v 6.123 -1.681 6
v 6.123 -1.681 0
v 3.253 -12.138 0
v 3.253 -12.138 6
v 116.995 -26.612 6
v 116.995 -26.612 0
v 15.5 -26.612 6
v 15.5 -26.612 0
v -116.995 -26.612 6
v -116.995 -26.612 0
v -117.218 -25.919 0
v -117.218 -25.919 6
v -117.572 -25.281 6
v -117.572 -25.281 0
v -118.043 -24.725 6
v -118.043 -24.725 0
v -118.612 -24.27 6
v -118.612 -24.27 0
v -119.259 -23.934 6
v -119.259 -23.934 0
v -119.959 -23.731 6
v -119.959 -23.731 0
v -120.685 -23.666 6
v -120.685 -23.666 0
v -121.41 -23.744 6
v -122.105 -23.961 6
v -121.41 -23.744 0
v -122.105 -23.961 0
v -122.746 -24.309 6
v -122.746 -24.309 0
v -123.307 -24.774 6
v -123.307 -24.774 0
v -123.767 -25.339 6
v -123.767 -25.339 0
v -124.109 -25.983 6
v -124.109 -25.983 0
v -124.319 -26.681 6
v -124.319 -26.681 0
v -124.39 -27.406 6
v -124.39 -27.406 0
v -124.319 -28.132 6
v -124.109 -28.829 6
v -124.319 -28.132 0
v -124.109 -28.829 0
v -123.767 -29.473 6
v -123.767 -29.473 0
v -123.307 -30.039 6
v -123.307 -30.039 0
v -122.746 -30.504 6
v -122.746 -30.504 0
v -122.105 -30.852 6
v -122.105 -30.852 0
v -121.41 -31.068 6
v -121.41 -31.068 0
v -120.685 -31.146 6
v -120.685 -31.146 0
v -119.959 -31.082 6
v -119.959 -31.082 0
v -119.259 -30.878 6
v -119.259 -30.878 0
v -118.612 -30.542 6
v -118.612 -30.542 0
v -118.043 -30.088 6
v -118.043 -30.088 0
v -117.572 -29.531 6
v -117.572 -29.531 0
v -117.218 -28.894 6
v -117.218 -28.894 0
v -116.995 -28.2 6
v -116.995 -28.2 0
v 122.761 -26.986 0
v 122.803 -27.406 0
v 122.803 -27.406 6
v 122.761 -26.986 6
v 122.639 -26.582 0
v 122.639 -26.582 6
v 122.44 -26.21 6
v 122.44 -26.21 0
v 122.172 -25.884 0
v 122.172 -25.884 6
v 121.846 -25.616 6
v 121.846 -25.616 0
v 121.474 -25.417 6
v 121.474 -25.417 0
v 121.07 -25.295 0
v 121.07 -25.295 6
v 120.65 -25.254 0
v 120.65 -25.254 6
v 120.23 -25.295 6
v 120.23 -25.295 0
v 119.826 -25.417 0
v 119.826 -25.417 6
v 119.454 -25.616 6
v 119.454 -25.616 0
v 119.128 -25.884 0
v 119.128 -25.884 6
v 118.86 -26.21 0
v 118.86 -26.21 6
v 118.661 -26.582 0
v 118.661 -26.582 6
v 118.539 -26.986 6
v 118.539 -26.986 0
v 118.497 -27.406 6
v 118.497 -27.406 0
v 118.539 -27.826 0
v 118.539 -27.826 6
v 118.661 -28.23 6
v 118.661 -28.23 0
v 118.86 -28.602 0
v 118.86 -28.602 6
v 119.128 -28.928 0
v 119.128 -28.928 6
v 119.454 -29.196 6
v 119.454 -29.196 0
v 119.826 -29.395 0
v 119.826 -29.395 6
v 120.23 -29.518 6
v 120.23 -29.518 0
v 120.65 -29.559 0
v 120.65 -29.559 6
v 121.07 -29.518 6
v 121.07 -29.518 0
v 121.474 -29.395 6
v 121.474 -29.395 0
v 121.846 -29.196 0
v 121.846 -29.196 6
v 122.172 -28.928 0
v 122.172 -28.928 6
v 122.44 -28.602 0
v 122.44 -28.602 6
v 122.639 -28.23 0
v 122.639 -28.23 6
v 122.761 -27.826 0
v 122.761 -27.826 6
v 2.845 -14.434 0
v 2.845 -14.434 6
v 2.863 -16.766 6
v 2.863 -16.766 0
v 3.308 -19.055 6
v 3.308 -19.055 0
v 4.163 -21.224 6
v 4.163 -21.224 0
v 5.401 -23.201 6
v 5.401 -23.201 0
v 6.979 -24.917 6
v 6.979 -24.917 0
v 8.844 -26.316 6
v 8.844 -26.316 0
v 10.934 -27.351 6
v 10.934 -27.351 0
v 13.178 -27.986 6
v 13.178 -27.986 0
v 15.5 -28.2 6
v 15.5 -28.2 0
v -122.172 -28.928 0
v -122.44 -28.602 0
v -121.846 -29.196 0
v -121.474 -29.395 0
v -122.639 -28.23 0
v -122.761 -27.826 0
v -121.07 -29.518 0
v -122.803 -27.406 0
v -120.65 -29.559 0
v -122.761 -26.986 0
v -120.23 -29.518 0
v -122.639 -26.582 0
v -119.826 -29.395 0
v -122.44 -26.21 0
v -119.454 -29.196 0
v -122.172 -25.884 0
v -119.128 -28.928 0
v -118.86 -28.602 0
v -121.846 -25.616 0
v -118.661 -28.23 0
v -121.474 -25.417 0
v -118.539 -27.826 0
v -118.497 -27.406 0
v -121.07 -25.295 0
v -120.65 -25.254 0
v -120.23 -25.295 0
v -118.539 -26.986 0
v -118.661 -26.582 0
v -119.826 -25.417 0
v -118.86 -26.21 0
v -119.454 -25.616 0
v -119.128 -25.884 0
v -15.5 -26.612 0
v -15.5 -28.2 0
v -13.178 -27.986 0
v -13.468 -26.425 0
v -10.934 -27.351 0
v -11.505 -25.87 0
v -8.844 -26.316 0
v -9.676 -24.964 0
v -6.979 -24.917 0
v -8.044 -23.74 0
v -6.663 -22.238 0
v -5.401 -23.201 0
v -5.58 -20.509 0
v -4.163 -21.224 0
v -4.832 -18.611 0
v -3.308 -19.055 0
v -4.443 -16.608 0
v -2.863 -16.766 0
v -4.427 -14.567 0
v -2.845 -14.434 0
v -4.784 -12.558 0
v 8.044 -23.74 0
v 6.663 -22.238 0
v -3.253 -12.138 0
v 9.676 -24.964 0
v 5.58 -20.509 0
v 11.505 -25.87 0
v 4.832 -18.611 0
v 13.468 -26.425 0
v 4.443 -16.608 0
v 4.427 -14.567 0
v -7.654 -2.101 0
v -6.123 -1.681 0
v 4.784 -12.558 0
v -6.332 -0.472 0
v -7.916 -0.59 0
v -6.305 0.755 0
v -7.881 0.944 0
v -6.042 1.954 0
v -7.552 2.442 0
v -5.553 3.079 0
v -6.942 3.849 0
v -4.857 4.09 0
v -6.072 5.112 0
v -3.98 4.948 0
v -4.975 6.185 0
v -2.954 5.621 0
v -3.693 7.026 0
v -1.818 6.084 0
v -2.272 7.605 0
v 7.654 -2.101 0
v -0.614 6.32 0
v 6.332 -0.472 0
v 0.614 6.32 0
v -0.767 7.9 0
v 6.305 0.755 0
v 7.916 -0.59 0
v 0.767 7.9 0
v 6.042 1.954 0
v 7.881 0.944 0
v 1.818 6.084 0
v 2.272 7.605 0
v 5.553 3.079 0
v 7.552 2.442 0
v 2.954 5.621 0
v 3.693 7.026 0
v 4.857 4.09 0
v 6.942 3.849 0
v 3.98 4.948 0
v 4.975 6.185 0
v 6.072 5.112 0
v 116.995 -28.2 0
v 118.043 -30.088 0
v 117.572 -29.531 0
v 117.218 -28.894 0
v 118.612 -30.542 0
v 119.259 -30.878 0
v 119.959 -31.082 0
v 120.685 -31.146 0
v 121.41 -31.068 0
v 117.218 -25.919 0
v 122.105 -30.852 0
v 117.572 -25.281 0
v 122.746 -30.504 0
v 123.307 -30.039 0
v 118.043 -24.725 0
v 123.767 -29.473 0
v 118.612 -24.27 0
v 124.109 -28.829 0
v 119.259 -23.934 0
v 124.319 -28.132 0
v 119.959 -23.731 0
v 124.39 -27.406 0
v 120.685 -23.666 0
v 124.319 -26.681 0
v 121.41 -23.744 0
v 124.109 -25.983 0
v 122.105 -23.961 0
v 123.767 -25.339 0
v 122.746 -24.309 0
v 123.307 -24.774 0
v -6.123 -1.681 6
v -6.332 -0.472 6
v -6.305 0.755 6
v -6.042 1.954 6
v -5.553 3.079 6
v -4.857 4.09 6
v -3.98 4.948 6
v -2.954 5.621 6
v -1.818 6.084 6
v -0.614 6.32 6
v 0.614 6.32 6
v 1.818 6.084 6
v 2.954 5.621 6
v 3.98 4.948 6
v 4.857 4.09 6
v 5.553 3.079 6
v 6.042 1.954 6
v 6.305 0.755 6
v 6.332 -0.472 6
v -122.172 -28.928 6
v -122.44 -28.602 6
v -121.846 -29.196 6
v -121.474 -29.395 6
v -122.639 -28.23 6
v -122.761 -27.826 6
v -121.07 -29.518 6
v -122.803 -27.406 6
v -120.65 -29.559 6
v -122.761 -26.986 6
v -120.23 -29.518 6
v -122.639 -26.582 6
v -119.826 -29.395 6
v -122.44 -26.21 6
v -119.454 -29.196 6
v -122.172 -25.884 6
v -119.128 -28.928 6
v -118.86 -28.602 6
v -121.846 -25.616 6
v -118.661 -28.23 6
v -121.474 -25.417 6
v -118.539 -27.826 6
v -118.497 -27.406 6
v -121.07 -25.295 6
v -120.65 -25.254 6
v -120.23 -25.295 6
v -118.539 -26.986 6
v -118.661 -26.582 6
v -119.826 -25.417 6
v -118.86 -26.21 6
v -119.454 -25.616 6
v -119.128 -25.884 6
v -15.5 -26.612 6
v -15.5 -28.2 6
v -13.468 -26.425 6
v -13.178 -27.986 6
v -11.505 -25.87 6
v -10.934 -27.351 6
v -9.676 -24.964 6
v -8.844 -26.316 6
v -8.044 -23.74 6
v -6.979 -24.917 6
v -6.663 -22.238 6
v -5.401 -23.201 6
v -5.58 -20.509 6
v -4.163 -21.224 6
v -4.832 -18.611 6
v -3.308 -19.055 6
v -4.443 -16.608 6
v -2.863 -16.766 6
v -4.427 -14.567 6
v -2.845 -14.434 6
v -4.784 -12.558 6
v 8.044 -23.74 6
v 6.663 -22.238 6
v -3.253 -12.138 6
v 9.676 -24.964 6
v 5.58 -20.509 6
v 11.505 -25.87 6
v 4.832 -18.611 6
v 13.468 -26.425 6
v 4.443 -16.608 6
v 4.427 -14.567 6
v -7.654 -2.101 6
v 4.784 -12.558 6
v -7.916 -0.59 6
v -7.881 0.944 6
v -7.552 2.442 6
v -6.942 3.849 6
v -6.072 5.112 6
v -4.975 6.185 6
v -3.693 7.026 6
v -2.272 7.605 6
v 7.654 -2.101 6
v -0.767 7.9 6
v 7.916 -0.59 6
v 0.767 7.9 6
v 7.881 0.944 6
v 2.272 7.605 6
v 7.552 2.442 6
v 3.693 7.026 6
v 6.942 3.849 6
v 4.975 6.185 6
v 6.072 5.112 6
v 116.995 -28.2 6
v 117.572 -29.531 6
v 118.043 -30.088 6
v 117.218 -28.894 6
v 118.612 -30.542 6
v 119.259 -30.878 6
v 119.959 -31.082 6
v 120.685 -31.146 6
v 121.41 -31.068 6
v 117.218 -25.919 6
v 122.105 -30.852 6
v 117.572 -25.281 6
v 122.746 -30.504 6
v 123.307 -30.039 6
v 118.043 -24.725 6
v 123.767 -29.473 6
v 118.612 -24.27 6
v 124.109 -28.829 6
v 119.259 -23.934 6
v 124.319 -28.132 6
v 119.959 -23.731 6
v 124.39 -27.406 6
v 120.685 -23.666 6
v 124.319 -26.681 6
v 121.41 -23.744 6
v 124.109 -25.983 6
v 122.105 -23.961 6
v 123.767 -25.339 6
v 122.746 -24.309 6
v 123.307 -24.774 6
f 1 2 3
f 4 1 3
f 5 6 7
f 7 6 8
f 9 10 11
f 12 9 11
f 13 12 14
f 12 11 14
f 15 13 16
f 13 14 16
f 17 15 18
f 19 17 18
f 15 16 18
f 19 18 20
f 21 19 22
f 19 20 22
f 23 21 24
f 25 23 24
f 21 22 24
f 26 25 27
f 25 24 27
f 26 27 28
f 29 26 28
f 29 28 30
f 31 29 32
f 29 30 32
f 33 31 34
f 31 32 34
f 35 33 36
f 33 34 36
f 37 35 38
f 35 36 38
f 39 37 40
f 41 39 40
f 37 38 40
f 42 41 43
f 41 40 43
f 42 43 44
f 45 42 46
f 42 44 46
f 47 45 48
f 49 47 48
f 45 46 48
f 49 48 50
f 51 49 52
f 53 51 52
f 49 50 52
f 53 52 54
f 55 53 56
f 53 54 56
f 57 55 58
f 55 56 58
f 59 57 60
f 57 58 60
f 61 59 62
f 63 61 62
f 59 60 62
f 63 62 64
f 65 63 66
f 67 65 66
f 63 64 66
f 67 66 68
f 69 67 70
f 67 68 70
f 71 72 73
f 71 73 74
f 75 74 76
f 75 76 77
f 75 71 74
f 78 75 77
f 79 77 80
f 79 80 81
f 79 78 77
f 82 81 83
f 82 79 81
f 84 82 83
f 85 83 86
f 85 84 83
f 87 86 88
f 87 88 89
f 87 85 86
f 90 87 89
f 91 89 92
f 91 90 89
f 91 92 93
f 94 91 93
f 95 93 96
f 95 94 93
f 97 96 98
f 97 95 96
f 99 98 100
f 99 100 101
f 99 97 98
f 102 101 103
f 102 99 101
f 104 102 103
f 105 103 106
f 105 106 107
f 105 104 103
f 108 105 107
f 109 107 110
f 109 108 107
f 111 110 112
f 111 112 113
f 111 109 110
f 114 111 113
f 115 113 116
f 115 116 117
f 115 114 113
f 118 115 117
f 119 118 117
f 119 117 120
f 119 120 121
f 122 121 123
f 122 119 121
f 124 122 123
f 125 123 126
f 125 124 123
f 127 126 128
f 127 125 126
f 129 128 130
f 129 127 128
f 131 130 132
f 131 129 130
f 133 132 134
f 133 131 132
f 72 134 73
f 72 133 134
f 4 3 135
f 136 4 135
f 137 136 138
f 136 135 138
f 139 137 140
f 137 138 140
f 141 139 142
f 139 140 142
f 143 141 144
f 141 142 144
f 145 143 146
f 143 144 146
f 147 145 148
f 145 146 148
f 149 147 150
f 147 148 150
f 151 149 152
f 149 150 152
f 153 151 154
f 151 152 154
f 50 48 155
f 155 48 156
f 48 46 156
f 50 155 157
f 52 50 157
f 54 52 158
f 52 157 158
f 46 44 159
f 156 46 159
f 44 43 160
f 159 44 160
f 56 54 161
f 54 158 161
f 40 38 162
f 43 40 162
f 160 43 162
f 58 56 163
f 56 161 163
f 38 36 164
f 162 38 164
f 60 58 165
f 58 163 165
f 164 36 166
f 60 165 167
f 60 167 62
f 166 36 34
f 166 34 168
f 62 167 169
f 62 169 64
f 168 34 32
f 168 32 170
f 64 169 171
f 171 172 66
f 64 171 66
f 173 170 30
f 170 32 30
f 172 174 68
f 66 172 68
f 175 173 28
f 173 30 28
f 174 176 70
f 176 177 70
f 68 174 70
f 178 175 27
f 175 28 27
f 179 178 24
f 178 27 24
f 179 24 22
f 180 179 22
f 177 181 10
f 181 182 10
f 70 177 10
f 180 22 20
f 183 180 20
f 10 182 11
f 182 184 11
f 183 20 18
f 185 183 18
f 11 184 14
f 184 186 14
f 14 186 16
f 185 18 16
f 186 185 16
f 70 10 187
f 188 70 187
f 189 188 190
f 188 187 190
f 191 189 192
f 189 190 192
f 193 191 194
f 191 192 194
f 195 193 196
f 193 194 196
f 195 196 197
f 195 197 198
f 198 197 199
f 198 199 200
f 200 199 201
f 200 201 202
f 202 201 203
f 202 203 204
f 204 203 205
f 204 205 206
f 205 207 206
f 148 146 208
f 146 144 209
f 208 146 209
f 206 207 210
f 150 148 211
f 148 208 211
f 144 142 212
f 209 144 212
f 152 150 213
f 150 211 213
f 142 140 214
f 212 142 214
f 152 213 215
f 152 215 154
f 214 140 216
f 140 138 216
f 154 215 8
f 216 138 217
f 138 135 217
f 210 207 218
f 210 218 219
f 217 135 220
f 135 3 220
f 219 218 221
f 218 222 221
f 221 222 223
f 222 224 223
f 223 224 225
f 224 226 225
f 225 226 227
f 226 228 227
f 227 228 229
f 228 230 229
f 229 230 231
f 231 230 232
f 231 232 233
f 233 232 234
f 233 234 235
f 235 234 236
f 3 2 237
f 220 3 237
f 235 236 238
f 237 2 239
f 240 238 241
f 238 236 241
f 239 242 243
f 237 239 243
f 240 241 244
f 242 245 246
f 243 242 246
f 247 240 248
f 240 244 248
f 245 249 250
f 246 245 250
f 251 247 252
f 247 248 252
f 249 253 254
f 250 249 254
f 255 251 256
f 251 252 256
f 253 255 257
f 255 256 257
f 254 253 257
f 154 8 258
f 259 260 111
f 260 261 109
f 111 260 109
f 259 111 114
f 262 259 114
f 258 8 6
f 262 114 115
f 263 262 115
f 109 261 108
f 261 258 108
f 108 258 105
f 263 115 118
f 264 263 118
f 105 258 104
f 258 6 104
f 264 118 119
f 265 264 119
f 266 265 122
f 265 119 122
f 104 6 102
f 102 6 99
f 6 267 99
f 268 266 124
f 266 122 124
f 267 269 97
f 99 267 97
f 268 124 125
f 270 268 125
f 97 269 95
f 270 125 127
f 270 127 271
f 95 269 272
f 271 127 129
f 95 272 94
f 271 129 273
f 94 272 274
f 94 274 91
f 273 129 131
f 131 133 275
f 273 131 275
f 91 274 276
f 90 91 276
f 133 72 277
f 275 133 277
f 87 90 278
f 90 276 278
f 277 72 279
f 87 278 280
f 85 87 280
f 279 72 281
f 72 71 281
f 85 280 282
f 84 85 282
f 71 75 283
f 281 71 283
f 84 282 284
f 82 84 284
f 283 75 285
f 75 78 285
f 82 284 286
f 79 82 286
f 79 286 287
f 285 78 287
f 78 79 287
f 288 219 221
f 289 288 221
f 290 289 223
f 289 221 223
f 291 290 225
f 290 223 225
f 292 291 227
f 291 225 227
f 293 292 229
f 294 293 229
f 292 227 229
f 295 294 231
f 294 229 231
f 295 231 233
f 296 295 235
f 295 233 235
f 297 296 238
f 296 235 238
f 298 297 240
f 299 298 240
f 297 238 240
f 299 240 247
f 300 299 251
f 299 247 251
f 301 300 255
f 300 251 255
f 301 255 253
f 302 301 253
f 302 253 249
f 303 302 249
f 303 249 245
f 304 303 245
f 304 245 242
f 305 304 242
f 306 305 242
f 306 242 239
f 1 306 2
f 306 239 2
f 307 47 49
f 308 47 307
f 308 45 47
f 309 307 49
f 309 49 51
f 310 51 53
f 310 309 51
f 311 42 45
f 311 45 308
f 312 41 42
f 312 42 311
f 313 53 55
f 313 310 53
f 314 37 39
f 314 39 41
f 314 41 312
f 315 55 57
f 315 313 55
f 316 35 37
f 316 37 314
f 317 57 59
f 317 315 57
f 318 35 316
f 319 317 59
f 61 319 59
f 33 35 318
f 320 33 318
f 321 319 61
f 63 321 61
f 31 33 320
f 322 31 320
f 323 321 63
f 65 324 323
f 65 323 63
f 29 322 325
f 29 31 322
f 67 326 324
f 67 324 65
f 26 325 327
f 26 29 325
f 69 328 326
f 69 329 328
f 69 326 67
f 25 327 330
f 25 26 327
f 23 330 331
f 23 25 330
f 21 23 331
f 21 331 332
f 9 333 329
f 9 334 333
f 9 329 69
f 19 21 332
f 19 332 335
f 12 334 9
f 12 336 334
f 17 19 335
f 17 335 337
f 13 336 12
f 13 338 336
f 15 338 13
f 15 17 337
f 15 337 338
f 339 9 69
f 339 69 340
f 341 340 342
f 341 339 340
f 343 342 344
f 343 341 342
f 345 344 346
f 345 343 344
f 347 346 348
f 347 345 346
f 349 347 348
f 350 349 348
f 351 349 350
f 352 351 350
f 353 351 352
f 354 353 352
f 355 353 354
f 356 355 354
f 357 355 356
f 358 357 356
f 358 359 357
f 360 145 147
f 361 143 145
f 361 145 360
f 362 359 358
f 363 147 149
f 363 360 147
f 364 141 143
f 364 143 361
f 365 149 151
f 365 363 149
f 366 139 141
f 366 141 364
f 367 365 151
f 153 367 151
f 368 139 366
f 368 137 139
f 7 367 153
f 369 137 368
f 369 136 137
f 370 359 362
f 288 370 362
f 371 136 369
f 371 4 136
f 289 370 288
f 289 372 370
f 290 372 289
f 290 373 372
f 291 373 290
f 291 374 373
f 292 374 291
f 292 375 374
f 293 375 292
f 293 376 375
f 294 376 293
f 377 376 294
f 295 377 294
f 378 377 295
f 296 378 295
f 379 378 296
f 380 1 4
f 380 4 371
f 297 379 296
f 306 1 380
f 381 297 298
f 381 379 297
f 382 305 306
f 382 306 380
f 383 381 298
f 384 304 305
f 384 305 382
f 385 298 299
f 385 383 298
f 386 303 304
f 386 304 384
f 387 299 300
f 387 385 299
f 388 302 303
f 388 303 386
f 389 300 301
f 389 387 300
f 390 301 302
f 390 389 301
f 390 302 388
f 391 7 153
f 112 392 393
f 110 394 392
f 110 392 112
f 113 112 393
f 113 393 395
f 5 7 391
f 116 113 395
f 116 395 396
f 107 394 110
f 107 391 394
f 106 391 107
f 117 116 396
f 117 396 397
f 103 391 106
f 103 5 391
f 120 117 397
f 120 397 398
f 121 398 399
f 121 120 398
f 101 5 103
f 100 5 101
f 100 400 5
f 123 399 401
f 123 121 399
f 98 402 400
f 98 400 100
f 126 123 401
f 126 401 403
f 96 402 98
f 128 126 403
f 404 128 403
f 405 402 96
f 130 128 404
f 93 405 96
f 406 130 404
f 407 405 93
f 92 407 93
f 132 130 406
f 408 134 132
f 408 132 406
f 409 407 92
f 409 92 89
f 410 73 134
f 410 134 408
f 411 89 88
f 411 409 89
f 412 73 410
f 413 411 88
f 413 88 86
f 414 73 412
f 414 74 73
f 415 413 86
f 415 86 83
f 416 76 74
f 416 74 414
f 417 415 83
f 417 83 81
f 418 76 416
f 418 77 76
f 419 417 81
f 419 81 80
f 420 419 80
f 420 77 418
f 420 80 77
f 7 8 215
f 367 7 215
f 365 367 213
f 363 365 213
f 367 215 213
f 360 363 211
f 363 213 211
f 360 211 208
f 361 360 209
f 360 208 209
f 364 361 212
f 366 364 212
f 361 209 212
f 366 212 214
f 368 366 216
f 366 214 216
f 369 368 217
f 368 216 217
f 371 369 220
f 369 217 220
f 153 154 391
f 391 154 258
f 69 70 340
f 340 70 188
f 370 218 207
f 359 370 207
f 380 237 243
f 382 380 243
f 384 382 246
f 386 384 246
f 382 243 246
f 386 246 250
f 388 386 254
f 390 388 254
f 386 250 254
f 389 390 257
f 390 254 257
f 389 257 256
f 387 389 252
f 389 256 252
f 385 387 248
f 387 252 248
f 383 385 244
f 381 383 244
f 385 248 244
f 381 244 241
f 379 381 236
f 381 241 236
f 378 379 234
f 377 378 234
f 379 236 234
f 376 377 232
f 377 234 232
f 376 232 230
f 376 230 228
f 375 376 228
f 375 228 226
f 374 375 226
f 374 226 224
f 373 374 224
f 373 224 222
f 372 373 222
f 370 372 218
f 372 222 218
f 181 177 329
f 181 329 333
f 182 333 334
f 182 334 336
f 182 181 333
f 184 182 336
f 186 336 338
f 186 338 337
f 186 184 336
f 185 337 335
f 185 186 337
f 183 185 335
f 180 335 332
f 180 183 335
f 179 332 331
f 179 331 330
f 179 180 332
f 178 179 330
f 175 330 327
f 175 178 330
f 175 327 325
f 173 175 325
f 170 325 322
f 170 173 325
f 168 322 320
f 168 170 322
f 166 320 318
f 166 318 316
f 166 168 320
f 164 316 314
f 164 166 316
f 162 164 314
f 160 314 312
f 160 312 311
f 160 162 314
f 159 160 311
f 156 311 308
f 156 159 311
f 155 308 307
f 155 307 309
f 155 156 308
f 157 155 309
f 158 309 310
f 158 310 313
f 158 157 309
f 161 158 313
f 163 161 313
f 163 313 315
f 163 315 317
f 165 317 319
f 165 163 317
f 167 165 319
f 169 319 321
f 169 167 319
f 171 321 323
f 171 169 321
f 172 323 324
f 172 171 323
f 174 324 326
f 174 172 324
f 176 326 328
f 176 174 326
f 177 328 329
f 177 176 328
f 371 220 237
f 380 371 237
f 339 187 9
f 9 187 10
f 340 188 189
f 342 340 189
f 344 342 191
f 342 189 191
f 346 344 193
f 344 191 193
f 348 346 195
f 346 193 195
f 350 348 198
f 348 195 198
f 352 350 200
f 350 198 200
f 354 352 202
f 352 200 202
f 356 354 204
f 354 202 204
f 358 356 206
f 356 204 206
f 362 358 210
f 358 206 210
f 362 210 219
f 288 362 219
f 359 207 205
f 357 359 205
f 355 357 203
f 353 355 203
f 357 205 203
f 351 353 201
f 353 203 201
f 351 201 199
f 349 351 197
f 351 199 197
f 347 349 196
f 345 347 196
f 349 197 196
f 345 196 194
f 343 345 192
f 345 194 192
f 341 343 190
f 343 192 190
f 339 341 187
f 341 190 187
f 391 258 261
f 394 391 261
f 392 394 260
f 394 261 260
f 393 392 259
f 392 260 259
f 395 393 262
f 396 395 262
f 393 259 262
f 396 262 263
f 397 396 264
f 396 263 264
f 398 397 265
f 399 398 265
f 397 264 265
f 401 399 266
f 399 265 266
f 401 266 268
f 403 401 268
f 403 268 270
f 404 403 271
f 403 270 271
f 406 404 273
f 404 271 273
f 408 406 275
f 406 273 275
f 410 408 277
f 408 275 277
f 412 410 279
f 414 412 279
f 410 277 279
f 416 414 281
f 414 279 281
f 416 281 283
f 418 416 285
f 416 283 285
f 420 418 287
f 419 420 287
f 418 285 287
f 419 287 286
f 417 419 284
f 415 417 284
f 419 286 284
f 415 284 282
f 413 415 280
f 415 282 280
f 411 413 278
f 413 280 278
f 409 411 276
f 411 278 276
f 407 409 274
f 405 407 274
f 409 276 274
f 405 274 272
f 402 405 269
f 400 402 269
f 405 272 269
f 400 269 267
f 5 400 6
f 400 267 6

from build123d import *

# Parameters (mm, degrees)
F0_R     = 2.15265
F1_DEPTH = 6


with BuildPart() as f1:
    # F0 (on Top) → F1 (new body)
    with BuildSketch(Plane.XY):
        with BuildLine():
            ThreePointArc((-6.123496, -1.680862), (0, 6.35), (6.123496, -1.680862))
            Line((6.123496, -1.680862), (3.253002, -12.138271))
            ThreePointArc((3.253002, -12.138271), (5.400888, -23.200518), (15.499994, -28.199994))
            Line((15.499994, -28.199994), (116.995047, -28.199994))
            ThreePointArc((116.995047, -28.199994), (124.39015, -27.406244), (116.995047, -26.612494))
            Line((116.995047, -26.612494), (15.499994, -26.612494))
            ThreePointArc((15.499994, -26.612494), (6.663277, -22.237952), (4.783876, -12.558487))
            Line((4.783876, -12.558487), (7.65437, -2.101077))
            ThreePointArc((7.65437, -2.101077), (0, 7.9375), (-7.65437, -2.101077))
            Line((-7.65437, -2.101077), (-4.783876, -12.558487))
            ThreePointArc((-4.783876, -12.558487), (-6.663277, -22.237952), (-15.499994, -26.612494))
            Line((-15.499994, -26.612494), (-116.995047, -26.612494))
            ThreePointArc((-116.995047, -26.612494), (-124.39015, -27.406244), (-116.995047, -28.199994))
            Line((-116.995047, -28.199994), (-15.499994, -28.199994))
            ThreePointArc((-15.499994, -28.199994), (-5.400888, -23.200518), (-3.253002, -12.138271))
            Line((-3.253002, -12.138271), (-6.123496, -1.680862))
        make_face()
        with Locations((-120.65, -27.406244)):
            Circle(F0_R, mode=Mode.SUBTRACT)
        with Locations((120.65, -27.406244)):
            Circle(F0_R, mode=Mode.SUBTRACT)
    extrude(amount=F1_DEPTH)


solid = f1.part
